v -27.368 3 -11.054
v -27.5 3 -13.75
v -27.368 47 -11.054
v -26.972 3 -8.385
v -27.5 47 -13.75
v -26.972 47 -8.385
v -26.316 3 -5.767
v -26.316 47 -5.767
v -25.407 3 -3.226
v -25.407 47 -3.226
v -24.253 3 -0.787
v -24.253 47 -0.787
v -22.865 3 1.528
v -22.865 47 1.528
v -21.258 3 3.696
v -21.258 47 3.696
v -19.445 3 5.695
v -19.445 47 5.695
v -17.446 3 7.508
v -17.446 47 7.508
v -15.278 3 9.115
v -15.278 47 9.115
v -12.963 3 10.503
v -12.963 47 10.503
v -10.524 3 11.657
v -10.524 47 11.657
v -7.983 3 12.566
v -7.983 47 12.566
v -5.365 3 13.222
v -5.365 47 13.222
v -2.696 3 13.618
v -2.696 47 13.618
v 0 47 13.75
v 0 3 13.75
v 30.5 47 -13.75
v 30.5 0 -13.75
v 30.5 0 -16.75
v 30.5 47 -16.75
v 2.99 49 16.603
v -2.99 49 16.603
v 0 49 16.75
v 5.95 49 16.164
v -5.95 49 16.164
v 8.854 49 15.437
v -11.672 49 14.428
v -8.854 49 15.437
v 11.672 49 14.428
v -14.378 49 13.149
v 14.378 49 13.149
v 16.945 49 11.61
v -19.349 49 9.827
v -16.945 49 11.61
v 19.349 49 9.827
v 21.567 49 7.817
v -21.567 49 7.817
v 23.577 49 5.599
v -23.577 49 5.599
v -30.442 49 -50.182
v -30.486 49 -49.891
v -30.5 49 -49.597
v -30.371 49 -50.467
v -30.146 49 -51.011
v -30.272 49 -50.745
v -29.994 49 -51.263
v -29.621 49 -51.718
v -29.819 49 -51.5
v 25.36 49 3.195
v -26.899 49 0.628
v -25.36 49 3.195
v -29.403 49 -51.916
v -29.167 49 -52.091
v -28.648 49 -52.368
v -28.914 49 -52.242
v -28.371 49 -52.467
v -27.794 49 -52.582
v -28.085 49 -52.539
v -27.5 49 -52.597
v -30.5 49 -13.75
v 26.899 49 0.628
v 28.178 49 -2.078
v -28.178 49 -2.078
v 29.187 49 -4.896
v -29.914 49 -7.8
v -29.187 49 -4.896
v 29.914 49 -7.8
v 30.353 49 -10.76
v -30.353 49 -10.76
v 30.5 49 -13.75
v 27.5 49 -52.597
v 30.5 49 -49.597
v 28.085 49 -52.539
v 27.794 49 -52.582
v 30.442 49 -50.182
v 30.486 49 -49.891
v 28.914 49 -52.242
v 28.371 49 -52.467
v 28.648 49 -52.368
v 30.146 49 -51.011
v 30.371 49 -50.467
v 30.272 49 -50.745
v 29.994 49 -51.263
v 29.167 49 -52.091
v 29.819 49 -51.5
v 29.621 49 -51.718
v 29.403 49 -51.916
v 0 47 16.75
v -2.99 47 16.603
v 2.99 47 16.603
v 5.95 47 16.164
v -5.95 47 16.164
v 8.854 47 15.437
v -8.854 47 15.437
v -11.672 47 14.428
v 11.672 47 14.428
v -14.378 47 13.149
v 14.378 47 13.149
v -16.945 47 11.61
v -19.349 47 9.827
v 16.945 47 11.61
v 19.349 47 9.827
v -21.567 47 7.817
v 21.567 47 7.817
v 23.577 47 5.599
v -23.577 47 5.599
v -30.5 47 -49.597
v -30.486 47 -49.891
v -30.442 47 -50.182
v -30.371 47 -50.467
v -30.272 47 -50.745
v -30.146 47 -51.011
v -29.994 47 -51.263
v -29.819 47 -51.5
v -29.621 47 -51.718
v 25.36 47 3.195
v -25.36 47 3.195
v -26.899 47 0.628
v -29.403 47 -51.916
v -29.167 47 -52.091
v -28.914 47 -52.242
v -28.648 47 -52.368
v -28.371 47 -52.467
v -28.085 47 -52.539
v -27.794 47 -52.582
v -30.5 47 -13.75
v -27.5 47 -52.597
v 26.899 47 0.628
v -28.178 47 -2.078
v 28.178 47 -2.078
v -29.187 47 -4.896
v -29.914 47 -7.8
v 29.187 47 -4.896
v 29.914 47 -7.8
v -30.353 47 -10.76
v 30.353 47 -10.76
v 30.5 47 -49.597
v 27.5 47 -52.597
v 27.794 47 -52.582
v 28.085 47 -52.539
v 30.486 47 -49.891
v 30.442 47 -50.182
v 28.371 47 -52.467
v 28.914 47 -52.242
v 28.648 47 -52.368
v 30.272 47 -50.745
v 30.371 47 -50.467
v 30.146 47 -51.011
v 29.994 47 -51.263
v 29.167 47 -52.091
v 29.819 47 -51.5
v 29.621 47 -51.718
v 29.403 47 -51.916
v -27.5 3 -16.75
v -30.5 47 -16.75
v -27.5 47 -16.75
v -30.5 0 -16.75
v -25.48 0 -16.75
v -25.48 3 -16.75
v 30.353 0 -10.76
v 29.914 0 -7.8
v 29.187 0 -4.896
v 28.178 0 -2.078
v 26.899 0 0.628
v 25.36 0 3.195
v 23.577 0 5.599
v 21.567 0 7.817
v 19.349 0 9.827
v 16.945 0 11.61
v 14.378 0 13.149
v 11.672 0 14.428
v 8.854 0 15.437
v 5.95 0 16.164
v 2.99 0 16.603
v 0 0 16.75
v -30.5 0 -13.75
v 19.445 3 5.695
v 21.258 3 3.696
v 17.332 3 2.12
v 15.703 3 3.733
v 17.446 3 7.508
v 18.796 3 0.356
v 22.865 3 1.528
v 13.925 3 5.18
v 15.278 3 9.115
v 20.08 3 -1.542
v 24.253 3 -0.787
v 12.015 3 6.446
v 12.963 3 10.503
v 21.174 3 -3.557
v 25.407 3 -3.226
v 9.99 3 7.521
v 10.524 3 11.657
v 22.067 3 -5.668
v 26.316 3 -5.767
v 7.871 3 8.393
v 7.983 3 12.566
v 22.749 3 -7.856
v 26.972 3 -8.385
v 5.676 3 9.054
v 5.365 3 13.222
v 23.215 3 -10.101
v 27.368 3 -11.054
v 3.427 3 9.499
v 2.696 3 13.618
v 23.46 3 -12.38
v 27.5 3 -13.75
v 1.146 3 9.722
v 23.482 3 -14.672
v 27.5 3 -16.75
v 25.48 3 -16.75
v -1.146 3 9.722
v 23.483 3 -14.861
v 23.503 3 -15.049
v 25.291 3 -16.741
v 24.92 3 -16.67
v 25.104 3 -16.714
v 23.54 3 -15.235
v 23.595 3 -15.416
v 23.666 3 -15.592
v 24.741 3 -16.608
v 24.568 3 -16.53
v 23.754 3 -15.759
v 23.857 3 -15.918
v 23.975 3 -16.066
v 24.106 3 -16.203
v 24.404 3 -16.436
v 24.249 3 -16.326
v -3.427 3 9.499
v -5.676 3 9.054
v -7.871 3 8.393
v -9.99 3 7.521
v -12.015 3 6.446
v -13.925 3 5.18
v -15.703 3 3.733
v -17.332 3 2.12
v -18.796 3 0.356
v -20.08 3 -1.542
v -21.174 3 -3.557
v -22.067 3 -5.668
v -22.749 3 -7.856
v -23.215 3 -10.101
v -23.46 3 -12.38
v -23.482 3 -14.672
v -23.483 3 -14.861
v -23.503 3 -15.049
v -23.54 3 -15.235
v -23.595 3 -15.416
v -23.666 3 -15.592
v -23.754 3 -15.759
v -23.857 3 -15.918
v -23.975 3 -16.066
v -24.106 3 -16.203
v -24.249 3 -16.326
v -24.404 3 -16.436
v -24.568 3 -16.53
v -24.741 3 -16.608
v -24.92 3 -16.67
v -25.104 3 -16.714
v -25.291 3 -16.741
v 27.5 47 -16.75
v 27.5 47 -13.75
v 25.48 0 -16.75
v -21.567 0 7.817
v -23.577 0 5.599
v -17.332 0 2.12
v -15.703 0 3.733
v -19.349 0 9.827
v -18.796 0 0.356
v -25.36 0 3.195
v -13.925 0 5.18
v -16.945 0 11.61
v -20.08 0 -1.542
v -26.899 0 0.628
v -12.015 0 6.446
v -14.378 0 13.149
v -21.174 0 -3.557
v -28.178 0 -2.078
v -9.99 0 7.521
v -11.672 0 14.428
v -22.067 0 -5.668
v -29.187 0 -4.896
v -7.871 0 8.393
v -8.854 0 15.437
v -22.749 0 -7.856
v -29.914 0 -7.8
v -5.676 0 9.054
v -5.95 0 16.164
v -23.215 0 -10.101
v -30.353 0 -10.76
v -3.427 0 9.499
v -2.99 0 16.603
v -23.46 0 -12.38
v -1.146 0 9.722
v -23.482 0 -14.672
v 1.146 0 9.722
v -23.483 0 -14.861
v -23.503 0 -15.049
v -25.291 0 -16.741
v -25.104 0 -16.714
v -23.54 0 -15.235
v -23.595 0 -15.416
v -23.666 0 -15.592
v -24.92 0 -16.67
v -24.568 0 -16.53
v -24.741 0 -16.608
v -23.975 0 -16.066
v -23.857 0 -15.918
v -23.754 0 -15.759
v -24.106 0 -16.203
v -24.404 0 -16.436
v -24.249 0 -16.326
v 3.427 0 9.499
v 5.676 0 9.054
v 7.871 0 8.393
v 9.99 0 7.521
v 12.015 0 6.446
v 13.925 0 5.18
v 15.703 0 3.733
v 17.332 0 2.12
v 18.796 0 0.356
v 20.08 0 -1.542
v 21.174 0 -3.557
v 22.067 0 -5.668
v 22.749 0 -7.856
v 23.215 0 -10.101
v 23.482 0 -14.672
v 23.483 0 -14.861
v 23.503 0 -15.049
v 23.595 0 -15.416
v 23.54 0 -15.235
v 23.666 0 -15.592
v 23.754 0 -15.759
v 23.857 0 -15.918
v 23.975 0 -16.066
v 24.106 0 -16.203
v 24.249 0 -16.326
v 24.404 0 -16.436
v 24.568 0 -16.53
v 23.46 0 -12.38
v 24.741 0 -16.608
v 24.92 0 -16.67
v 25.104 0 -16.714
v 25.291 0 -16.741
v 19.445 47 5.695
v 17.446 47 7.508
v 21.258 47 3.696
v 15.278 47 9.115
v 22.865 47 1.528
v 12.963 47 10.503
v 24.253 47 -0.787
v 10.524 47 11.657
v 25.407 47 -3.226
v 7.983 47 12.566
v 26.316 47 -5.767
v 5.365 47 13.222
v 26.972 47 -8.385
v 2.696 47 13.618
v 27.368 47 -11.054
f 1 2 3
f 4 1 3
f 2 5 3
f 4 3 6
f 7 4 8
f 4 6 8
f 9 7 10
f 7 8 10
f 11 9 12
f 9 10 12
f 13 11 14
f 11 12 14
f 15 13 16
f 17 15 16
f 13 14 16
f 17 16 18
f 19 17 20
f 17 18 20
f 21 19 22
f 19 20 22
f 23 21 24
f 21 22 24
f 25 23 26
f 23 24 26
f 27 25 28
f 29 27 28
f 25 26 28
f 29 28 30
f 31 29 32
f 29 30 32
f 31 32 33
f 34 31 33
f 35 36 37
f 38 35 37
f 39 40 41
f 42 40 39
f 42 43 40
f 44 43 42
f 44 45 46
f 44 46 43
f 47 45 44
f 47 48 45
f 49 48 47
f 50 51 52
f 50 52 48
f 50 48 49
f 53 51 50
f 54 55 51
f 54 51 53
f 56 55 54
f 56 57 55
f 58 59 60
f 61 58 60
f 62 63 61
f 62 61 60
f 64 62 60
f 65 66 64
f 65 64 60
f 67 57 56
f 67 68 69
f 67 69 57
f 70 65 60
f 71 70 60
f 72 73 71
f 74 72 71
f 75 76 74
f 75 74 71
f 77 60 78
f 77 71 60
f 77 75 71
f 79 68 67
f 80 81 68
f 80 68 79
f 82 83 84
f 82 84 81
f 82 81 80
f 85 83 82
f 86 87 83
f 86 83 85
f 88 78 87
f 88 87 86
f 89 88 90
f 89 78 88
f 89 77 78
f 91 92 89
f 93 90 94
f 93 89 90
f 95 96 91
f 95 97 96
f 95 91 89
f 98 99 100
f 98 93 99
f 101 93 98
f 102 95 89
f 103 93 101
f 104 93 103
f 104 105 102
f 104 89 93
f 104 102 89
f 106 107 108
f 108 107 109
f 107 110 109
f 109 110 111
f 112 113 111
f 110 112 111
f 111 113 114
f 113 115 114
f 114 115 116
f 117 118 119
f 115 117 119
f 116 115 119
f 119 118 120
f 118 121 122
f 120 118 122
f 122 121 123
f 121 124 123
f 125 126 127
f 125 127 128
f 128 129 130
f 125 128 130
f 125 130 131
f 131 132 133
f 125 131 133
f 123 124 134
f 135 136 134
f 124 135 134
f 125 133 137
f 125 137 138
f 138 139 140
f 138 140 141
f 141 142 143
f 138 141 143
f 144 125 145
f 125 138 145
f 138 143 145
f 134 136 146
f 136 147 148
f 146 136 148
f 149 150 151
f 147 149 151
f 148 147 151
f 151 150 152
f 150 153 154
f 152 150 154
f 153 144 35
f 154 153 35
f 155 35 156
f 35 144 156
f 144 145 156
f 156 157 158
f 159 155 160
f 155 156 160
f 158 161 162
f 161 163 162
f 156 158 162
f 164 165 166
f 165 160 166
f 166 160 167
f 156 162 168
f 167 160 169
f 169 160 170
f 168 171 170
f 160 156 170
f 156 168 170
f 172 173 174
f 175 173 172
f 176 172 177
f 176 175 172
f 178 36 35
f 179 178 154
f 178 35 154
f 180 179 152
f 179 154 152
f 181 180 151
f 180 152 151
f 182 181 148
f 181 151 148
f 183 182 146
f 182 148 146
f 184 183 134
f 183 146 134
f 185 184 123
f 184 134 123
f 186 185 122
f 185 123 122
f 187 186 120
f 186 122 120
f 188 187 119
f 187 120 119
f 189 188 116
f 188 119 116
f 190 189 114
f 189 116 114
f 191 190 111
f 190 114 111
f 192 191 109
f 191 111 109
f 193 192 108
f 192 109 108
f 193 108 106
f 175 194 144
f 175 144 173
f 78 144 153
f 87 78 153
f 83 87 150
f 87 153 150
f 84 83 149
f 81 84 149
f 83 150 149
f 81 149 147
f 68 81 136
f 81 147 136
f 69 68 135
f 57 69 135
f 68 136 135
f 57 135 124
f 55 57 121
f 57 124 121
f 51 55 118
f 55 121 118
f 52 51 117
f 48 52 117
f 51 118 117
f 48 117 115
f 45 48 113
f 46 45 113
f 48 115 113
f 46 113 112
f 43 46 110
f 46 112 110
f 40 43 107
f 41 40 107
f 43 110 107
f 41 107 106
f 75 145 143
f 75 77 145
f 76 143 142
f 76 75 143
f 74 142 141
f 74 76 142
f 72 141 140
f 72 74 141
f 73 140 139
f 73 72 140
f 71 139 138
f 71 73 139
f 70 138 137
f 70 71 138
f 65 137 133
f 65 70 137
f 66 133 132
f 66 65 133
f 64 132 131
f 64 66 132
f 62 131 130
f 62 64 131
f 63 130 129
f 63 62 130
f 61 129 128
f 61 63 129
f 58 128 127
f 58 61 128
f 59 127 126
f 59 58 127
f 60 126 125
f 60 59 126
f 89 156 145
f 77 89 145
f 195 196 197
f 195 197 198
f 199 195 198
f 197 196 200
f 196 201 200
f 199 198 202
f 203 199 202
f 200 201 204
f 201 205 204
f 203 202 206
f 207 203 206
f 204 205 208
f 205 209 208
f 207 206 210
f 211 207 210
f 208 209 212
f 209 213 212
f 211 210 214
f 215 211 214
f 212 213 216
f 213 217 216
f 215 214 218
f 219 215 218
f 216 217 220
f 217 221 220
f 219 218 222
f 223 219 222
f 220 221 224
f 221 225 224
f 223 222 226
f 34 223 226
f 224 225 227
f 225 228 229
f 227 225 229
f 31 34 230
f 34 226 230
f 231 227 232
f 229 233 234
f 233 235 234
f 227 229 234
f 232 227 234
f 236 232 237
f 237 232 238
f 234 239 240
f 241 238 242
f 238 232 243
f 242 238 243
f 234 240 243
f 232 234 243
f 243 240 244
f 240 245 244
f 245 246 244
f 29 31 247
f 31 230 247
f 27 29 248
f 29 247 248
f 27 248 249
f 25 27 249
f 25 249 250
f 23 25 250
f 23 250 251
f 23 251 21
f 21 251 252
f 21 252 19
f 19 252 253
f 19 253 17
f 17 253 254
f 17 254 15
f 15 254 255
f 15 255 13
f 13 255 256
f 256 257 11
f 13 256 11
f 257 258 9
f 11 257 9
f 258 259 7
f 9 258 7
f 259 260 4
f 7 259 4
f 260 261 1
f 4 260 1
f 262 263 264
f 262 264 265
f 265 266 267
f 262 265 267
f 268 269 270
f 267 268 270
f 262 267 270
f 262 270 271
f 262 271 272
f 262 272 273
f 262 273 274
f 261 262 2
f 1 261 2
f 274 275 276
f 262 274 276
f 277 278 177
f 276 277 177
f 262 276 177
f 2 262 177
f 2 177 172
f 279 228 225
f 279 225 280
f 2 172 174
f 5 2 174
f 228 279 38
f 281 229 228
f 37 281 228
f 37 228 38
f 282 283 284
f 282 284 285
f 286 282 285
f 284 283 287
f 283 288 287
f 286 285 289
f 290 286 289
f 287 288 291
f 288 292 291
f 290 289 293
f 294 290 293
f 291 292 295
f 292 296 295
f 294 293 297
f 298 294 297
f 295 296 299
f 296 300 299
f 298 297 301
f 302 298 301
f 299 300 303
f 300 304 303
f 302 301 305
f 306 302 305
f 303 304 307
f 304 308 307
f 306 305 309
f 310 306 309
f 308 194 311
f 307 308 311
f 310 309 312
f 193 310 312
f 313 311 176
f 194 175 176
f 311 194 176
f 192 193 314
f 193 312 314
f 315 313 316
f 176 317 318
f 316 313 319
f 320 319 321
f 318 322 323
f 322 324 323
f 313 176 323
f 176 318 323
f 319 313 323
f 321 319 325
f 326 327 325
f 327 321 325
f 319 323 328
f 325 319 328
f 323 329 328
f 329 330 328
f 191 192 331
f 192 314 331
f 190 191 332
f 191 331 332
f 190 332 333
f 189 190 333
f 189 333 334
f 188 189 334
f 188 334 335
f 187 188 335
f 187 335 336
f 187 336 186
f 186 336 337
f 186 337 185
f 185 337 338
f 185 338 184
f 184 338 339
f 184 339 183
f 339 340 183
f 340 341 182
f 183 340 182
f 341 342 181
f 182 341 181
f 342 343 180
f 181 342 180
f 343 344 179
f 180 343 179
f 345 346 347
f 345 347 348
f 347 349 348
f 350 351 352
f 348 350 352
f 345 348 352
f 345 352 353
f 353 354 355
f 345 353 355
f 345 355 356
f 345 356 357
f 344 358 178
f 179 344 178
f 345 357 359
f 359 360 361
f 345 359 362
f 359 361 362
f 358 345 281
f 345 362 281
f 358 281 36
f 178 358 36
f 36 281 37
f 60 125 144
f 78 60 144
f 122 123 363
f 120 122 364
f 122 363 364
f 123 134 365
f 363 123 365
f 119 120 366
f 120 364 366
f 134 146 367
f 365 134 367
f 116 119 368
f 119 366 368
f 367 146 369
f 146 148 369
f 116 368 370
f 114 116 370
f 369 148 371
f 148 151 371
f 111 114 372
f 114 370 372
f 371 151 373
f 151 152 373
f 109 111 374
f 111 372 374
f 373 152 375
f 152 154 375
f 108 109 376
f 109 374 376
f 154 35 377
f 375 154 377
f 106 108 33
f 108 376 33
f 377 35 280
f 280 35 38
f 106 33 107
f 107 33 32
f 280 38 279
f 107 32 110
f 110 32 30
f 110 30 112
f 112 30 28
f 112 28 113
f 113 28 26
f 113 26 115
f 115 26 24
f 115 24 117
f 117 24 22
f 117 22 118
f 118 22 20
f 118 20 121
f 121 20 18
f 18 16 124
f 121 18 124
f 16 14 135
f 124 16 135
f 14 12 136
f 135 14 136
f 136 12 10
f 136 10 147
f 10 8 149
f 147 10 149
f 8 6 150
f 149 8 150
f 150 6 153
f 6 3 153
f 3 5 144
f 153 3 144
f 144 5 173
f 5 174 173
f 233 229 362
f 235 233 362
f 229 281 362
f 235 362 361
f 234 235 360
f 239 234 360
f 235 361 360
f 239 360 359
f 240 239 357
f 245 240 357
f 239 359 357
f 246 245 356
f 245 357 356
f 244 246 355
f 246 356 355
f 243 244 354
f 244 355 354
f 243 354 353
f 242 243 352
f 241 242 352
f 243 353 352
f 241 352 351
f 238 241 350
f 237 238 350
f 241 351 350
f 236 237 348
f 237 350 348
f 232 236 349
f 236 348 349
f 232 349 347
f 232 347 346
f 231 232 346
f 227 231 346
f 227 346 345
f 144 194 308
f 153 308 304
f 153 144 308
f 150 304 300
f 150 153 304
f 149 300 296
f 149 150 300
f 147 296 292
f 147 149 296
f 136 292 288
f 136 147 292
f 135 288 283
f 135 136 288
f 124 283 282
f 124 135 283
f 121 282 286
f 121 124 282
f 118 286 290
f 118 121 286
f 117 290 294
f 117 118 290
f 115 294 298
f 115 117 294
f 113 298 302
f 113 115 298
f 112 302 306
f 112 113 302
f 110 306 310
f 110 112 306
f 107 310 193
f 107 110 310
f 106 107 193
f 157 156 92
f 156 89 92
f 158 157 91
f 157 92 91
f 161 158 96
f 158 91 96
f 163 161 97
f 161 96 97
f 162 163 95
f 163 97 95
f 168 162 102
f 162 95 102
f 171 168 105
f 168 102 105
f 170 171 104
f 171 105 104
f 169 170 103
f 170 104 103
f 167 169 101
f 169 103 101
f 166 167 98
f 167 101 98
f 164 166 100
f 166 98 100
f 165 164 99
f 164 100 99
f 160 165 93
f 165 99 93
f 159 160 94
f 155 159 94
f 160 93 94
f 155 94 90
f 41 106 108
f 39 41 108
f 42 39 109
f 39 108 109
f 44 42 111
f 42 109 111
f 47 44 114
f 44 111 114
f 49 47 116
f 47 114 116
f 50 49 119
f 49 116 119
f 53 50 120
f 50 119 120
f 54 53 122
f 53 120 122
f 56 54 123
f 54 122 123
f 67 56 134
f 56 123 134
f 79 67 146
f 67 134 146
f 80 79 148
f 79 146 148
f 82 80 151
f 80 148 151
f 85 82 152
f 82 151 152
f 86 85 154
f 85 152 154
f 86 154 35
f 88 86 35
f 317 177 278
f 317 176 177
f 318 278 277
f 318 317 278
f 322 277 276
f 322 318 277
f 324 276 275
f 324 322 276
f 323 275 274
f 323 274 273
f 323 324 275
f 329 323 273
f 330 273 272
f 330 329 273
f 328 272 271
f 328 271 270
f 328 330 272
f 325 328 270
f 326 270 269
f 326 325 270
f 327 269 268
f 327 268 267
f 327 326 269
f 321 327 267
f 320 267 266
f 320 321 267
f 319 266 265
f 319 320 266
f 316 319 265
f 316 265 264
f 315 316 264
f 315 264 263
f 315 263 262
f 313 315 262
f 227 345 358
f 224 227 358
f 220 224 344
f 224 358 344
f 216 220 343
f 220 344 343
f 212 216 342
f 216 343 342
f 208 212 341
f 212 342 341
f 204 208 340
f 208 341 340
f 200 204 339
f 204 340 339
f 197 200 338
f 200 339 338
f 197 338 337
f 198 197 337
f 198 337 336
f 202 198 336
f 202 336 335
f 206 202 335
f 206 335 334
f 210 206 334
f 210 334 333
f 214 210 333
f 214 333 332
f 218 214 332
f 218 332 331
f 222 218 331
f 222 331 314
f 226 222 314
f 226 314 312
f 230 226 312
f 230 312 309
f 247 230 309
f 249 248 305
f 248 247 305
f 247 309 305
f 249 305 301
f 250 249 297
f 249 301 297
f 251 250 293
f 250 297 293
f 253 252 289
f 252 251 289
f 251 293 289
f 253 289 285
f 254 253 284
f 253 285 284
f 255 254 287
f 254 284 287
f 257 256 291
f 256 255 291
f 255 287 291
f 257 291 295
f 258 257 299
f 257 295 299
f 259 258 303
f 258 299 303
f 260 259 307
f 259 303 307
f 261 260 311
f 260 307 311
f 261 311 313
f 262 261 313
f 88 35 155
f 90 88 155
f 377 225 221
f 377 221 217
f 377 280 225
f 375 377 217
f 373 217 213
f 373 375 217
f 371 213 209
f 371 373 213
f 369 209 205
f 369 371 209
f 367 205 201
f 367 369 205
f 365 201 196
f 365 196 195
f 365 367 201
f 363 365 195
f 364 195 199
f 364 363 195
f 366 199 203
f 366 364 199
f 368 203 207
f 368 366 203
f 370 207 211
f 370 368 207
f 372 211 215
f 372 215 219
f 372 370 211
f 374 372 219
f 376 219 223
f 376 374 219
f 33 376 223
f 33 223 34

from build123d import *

# Parameters (mm, degrees)
SKETCH_1_W          = 61
SKETCH_1_H          = 33.5
EXTRUDE_1_DEPTH     = 50
SKETCH_2_W          = 55
SKETCH_2_H          = 44
CUT_EXTRUDE_1_DEPTH = 30.5
FILLET_3_R          = 27.5
FILLET_4_R          = 30.5
SKETCH_3_R          = 23.5
CUT_EXTRUDE_2_DEPTH = 30.5
SKETCH_5_R          = 16
CUT_EXTRUDE_4_DEPTH = 30.5
FILLET_5_R          = 4
FILLET_6_R          = 2
SKETCH_6_W          = 61
SKETCH_6_H          = 3
CUT_EXTRUDE_5_DEPTH = 400
SKETCH_8_W          = 55
SKETCH_8_H          = 3
SKETCH_8_W_2        = 3
EXTRUDE_2_DEPTH     = 2
FILLET_7_R          = 3


with BuildPart() as part:
    # 스케치1 → 보스-돌출1 (new body)
    with BuildSketch(Plane(origin=(0, 0, 0), x_dir=(1, 0, 0), z_dir=(0, 1, 0))):
        Rectangle(SKETCH_1_W, SKETCH_1_H)
    extrude(amount=EXTRUDE_1_DEPTH)

    # 스케치2 → 컷-돌출1 (cut)
    with BuildSketch(Plane(origin=(0, 0, -16.75), x_dir=(-1, 0, 0), z_dir=(0, 0, -1))):
        with Locations((0, 25)):
            Rectangle(SKETCH_2_W, SKETCH_2_H)
    extrude(amount=-CUT_EXTRUDE_1_DEPTH, mode=Mode.SUBTRACT)

    # 필렛3
    fillet_3_edges = [part.edges().sort_by_distance(p)[0] for p in [
        (-27.5, 25, 13.75),
        (27.5, 25, 13.75),
    ]]
    fillet(fillet_3_edges, radius=FILLET_3_R - 0.0001)  # a hair under: the kernel refuses the full size

    # 필렛4
    fillet_4_edges = [part.edges().sort_by_distance(p)[0] for p in [
        (-30.5, 25, 16.75),
        (30.5, 25, 16.75),
    ]]
    fillet(fillet_4_edges, radius=FILLET_4_R - 0.0001)  # a hair under: the kernel refuses the full size

    # 스케치3 → 컷-돌출2 (cut)
    with BuildSketch(Plane.XZ):
        with Locations((0, -13.75)):
            Circle(SKETCH_3_R)
    extrude(amount=-CUT_EXTRUDE_2_DEPTH, mode=Mode.SUBTRACT)

    # 스케치5 → 컷-돌출4 (cut)
    with BuildSketch(Plane.XZ.offset(-47)):
        with Locations((0, -13.75)):
            Circle(SKETCH_5_R)
    extrude(amount=-CUT_EXTRUDE_4_DEPTH, mode=Mode.SUBTRACT)

    # 필렛5
    fillet_5_edges = [part.edges().sort_by_distance(p)[0] for p in [
        (-15.716233646, 48.5, -16.75),
        (15.716233646, 48.5, -16.75),
    ]]
    fillet(fillet_5_edges, radius=FILLET_5_R)

    # 필렛6
    fillet_6_edges = [part.edges().sort_by_distance(p)[0] for p in [
        (-23.307724042, 1.5, -16.75),
        (23.307724042, 1.5, -16.75),
    ]]
    fillet(fillet_6_edges, radius=FILLET_6_R)

    # 스케치6 → 컷-돌출5 (cut)
    with BuildSketch(Plane(origin=(0, 0, -16.75), x_dir=(-1, 0, 0), z_dir=(0, 0, -1))):
        with Locations((0, 48.5)):
            Rectangle(SKETCH_6_W, SKETCH_6_H)
    extrude(amount=-CUT_EXTRUDE_5_DEPTH, mode=Mode.SUBTRACT)


with BuildPart() as body_2:
    # 스케치8 → 보스-돌출2 (new body)
    with BuildSketch(Plane(origin=(0, 47, 0), x_dir=(1, 0, 0), z_dir=(0, 1, 0))):
        with BuildLine():
            Line((27.5, 13.75), (-27.5, 13.75))
            ThreePointArc((-27.5, 13.75), (-19.445436483, -5.695436483), (0, -13.75))
            ThreePointArc((0, -13.75), (19.445436483, -5.695436483), (27.5, 13.75))
        make_face()
        with Locations((0, 15.25)):
            Rectangle(SKETCH_8_W, SKETCH_8_H)
        Polygon((-30.5, 52.596597545), (-30.5, 16.75), (-27.5, 16.75), (27.5, 16.75), (30.5, 16.75), (30.5, 52.596597545), align=None)
        with BuildLine():
            Line((-27.5, 13.75), (-30.5, 13.75))
            ThreePointArc((-30.5, 13.75), (-21.566756826, -7.816756826), (0, -16.75))
            ThreePointArc((0, -16.75), (21.566756826, -7.816756826), (30.5, 13.75))
            Line((30.5, 13.75), (27.5, 13.75))
            ThreePointArc((27.5, 13.75), (19.445436483, -5.695436483), (0, -13.75))
            ThreePointArc((0, -13.75), (-19.445436483, -5.695436483), (-27.5, 13.75))
        make_face()
        with Locations((29, 15.25)):
            Rectangle(SKETCH_8_W_2, SKETCH_8_H)
        with Locations((-29, 15.25)):
            Rectangle(SKETCH_8_W_2, SKETCH_8_H)
    extrude(amount=EXTRUDE_2_DEPTH)

    # 필렛7
    fillet_7_edges = [body_2.edges().sort_by_distance(p)[0] for p in [
        (-30.5, 48, -52.596597545),
        (30.5, 48, -52.596597545),
    ]]
    fillet(fillet_7_edges, radius=FILLET_7_R)


solid = Compound([part.part, body_2.part])
